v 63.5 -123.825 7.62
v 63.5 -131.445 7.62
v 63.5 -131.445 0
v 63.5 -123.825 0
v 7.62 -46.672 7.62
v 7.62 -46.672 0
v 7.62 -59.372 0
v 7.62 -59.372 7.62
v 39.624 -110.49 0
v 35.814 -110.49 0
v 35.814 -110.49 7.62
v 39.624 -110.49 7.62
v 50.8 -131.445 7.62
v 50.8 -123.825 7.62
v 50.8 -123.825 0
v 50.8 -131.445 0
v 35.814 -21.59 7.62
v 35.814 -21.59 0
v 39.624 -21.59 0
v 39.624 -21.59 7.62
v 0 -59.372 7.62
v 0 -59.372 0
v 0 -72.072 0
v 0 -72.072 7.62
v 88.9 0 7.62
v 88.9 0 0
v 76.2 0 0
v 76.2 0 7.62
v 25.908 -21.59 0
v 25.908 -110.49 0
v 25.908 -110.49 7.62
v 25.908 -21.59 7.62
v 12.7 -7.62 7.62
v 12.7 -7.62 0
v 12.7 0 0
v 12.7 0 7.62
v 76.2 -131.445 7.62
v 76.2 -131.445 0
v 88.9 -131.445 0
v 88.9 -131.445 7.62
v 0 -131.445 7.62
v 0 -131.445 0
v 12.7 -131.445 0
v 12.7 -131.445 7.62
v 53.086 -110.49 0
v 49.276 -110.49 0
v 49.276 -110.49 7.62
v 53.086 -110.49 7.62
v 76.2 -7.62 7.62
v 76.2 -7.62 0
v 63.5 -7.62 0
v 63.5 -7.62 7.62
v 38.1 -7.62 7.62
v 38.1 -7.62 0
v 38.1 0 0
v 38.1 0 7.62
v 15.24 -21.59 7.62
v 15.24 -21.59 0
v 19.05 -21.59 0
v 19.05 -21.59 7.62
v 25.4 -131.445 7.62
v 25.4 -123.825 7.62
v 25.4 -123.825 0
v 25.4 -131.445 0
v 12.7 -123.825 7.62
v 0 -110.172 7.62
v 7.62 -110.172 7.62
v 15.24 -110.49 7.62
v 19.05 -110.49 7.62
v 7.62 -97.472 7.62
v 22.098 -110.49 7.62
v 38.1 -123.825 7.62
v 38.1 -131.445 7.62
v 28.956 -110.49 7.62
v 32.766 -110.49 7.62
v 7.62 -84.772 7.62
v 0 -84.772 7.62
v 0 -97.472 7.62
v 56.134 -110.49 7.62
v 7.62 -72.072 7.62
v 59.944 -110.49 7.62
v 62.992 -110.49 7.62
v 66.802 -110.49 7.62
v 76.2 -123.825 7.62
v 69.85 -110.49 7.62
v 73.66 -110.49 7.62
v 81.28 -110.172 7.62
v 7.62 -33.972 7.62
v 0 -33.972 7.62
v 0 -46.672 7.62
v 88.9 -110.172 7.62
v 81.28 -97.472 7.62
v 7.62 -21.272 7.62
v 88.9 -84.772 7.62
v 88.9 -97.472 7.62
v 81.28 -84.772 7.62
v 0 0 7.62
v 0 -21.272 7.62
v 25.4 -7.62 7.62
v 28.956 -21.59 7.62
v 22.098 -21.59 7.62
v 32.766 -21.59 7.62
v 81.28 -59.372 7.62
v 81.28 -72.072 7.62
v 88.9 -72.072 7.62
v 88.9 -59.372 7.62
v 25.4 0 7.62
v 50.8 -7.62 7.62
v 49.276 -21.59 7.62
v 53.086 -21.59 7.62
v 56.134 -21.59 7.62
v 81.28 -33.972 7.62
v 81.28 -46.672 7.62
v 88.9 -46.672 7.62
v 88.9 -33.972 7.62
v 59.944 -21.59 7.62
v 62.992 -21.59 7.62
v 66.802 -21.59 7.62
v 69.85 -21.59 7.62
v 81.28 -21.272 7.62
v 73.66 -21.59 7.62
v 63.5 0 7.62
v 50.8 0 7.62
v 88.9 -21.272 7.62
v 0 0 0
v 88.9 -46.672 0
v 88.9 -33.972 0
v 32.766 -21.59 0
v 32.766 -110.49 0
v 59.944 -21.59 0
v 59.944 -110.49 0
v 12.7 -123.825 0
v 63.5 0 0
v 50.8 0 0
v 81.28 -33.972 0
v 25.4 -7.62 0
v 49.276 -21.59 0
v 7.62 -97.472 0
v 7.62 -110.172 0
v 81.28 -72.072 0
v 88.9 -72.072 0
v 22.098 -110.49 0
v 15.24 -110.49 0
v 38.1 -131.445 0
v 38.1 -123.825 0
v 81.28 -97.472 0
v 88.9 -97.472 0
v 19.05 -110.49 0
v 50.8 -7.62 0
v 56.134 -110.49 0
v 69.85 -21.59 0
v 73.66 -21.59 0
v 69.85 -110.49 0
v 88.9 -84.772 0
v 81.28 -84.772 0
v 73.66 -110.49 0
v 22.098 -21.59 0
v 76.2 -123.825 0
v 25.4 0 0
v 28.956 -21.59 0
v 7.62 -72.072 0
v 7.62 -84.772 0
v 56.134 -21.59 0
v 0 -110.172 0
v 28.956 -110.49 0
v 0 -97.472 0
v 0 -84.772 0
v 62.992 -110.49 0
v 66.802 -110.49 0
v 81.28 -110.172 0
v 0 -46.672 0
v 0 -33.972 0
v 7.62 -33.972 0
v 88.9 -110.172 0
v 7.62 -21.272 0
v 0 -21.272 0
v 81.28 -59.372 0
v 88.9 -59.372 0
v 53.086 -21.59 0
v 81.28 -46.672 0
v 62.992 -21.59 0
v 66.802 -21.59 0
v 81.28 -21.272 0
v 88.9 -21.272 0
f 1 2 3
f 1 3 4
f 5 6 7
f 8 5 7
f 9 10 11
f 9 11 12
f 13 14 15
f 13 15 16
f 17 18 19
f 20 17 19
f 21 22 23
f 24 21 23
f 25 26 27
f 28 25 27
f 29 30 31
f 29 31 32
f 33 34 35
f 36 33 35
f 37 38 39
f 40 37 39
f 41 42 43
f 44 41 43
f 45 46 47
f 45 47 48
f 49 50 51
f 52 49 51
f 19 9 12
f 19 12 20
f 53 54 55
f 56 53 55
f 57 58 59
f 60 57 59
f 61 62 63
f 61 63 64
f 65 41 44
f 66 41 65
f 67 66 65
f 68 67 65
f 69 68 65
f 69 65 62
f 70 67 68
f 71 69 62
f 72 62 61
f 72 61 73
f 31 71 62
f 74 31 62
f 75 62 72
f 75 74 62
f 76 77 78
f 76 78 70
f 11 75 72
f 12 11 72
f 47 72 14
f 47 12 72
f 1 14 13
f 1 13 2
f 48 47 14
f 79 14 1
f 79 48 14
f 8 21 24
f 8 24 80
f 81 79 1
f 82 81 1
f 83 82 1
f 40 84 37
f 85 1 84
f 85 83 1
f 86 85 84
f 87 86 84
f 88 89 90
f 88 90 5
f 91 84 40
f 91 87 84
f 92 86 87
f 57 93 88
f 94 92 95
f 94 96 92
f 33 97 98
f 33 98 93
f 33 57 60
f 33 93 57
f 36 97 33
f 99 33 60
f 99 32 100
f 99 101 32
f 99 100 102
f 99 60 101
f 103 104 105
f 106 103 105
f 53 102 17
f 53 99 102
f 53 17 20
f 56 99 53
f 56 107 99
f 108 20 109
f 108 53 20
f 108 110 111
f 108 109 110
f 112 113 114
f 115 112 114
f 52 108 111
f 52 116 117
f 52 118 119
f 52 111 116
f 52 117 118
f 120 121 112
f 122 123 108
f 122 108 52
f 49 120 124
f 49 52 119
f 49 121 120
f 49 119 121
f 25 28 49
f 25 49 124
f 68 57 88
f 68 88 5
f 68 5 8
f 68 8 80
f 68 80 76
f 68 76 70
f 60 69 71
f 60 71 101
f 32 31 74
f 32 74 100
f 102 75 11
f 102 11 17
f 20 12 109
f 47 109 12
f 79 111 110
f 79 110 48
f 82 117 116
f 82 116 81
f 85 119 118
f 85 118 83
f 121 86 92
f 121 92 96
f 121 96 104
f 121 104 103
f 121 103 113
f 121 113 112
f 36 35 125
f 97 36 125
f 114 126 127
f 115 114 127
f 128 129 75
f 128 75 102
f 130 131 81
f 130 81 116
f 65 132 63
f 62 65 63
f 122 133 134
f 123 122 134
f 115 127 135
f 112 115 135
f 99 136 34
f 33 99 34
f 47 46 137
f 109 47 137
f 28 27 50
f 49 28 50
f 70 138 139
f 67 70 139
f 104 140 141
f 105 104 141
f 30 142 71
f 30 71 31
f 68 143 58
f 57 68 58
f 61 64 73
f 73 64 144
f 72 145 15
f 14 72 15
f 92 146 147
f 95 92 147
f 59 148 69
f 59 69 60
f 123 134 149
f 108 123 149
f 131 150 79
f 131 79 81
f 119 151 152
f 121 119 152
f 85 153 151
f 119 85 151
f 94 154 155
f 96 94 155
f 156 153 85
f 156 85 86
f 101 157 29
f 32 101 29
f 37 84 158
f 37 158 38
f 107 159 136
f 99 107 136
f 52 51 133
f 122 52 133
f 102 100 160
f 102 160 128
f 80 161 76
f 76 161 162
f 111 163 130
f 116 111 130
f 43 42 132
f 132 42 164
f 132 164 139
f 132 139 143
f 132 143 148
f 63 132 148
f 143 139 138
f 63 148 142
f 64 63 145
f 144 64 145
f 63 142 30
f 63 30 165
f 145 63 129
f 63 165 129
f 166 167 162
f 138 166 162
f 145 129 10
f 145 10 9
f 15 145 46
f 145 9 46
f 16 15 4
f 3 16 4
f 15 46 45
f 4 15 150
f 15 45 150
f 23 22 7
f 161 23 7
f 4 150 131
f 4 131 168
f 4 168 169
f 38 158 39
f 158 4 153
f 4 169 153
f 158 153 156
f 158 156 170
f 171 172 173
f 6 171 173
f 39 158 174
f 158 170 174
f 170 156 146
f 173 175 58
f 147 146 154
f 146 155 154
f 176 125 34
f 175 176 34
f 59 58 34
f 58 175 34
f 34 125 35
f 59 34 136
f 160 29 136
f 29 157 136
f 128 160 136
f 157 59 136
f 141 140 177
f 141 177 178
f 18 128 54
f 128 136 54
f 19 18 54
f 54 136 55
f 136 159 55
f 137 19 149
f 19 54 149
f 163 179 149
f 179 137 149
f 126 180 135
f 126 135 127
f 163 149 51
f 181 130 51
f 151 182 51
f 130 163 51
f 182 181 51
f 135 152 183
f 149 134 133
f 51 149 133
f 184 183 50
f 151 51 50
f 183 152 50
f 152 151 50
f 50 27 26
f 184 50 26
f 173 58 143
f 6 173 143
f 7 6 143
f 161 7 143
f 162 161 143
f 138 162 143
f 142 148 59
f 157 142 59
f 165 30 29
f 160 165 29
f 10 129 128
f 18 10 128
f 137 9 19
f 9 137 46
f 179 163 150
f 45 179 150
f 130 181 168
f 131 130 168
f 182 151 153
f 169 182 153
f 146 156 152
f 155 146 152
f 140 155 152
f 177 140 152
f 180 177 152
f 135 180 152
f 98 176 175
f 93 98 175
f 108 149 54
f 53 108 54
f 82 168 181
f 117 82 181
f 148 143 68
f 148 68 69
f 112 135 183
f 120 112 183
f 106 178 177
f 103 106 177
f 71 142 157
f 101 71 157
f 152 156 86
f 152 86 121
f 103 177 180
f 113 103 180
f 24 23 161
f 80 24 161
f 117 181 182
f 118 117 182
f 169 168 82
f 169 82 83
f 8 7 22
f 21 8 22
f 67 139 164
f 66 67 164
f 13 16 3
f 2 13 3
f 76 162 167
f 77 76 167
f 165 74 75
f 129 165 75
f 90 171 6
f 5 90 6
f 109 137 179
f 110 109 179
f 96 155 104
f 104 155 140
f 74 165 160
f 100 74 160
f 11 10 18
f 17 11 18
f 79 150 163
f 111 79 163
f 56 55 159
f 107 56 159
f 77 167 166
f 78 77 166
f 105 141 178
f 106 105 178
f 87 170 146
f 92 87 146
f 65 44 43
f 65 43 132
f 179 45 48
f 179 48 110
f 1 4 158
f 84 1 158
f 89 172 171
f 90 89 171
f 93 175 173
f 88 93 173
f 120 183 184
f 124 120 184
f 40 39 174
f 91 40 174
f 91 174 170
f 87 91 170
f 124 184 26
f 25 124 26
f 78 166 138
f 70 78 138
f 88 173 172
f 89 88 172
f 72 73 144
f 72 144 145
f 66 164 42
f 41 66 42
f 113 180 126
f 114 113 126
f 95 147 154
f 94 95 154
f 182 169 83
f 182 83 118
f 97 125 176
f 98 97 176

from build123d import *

# Parameters (mm, degrees)
F0_W     = 3.81
F0_H     = 88.9
F1_DEPTH = 7.62


with BuildPart() as f1:
    # F0 (on Top) → F1 (new body)
    with BuildSketch(Plane.XY):
        Polygon((12.7, 0), (0, 0), (0, -21.2725), (7.62, -21.2725), (7.62, -33.9725), (0, -33.9725), (0, -46.6725), (7.62, -46.6725), (7.62, -59.3725), (0, -59.3725), (0, -72.0725), (7.62, -72.0725), (7.62, -84.7725), (0, -84.7725), (0, -97.4725), (7.62, -97.4725), (7.62, -110.1725), (0, -110.1725), (0, -131.445), (12.7, -131.445), (12.7, -123.825), (25.4, -123.825), (25.4, -131.445), (38.1, -131.445), (38.1, -123.825), (50.8, -123.825), (50.8, -131.445), (63.5, -131.445), (63.5, -123.825), (76.2, -123.825), (76.2, -131.445), (88.9, -131.445), (88.9, -110.1725), (81.28, -110.1725), (81.28, -97.4725), (88.9, -97.4725), (88.9, -84.7725), (81.28, -84.7725), (81.28, -72.0725), (88.9, -72.0725), (88.9, -59.3725), (81.28, -59.3725), (81.28, -46.6725), (88.9, -46.6725), (88.9, -33.9725), (81.28, -33.9725), (81.28, -21.2725), (88.9, -21.2725), (88.9, 0), (76.2, 0), (76.2, -7.62), (63.5, -7.62), (63.5, 0), (50.8, 0), (50.8, -7.62), (38.1, -7.62), (38.1, 0), (25.4, 0), (25.4, -7.62), (12.7, -7.62), align=None)
        with Locations((17.145, -66.04)):
            Rectangle(F0_W, F0_H, mode=Mode.SUBTRACT)
        with Locations((24.003, -66.04)):
            Rectangle(F0_W, F0_H, mode=Mode.SUBTRACT)
        with Locations((30.861, -66.04)):
            Rectangle(F0_W, F0_H, mode=Mode.SUBTRACT)
        with Locations((37.719, -66.04)):
            Rectangle(F0_W, F0_H, mode=Mode.SUBTRACT)
        with Locations((51.181, -66.04)):
            Rectangle(F0_W, F0_H, mode=Mode.SUBTRACT)
        with Locations((58.039, -66.04)):
            Rectangle(F0_W, F0_H, mode=Mode.SUBTRACT)
        with Locations((64.897, -66.04)):
            Rectangle(F0_W, F0_H, mode=Mode.SUBTRACT)
        with Locations((71.755, -66.04)):
            Rectangle(F0_W, F0_H, mode=Mode.SUBTRACT)
    extrude(amount=F1_DEPTH)


solid = f1.part
